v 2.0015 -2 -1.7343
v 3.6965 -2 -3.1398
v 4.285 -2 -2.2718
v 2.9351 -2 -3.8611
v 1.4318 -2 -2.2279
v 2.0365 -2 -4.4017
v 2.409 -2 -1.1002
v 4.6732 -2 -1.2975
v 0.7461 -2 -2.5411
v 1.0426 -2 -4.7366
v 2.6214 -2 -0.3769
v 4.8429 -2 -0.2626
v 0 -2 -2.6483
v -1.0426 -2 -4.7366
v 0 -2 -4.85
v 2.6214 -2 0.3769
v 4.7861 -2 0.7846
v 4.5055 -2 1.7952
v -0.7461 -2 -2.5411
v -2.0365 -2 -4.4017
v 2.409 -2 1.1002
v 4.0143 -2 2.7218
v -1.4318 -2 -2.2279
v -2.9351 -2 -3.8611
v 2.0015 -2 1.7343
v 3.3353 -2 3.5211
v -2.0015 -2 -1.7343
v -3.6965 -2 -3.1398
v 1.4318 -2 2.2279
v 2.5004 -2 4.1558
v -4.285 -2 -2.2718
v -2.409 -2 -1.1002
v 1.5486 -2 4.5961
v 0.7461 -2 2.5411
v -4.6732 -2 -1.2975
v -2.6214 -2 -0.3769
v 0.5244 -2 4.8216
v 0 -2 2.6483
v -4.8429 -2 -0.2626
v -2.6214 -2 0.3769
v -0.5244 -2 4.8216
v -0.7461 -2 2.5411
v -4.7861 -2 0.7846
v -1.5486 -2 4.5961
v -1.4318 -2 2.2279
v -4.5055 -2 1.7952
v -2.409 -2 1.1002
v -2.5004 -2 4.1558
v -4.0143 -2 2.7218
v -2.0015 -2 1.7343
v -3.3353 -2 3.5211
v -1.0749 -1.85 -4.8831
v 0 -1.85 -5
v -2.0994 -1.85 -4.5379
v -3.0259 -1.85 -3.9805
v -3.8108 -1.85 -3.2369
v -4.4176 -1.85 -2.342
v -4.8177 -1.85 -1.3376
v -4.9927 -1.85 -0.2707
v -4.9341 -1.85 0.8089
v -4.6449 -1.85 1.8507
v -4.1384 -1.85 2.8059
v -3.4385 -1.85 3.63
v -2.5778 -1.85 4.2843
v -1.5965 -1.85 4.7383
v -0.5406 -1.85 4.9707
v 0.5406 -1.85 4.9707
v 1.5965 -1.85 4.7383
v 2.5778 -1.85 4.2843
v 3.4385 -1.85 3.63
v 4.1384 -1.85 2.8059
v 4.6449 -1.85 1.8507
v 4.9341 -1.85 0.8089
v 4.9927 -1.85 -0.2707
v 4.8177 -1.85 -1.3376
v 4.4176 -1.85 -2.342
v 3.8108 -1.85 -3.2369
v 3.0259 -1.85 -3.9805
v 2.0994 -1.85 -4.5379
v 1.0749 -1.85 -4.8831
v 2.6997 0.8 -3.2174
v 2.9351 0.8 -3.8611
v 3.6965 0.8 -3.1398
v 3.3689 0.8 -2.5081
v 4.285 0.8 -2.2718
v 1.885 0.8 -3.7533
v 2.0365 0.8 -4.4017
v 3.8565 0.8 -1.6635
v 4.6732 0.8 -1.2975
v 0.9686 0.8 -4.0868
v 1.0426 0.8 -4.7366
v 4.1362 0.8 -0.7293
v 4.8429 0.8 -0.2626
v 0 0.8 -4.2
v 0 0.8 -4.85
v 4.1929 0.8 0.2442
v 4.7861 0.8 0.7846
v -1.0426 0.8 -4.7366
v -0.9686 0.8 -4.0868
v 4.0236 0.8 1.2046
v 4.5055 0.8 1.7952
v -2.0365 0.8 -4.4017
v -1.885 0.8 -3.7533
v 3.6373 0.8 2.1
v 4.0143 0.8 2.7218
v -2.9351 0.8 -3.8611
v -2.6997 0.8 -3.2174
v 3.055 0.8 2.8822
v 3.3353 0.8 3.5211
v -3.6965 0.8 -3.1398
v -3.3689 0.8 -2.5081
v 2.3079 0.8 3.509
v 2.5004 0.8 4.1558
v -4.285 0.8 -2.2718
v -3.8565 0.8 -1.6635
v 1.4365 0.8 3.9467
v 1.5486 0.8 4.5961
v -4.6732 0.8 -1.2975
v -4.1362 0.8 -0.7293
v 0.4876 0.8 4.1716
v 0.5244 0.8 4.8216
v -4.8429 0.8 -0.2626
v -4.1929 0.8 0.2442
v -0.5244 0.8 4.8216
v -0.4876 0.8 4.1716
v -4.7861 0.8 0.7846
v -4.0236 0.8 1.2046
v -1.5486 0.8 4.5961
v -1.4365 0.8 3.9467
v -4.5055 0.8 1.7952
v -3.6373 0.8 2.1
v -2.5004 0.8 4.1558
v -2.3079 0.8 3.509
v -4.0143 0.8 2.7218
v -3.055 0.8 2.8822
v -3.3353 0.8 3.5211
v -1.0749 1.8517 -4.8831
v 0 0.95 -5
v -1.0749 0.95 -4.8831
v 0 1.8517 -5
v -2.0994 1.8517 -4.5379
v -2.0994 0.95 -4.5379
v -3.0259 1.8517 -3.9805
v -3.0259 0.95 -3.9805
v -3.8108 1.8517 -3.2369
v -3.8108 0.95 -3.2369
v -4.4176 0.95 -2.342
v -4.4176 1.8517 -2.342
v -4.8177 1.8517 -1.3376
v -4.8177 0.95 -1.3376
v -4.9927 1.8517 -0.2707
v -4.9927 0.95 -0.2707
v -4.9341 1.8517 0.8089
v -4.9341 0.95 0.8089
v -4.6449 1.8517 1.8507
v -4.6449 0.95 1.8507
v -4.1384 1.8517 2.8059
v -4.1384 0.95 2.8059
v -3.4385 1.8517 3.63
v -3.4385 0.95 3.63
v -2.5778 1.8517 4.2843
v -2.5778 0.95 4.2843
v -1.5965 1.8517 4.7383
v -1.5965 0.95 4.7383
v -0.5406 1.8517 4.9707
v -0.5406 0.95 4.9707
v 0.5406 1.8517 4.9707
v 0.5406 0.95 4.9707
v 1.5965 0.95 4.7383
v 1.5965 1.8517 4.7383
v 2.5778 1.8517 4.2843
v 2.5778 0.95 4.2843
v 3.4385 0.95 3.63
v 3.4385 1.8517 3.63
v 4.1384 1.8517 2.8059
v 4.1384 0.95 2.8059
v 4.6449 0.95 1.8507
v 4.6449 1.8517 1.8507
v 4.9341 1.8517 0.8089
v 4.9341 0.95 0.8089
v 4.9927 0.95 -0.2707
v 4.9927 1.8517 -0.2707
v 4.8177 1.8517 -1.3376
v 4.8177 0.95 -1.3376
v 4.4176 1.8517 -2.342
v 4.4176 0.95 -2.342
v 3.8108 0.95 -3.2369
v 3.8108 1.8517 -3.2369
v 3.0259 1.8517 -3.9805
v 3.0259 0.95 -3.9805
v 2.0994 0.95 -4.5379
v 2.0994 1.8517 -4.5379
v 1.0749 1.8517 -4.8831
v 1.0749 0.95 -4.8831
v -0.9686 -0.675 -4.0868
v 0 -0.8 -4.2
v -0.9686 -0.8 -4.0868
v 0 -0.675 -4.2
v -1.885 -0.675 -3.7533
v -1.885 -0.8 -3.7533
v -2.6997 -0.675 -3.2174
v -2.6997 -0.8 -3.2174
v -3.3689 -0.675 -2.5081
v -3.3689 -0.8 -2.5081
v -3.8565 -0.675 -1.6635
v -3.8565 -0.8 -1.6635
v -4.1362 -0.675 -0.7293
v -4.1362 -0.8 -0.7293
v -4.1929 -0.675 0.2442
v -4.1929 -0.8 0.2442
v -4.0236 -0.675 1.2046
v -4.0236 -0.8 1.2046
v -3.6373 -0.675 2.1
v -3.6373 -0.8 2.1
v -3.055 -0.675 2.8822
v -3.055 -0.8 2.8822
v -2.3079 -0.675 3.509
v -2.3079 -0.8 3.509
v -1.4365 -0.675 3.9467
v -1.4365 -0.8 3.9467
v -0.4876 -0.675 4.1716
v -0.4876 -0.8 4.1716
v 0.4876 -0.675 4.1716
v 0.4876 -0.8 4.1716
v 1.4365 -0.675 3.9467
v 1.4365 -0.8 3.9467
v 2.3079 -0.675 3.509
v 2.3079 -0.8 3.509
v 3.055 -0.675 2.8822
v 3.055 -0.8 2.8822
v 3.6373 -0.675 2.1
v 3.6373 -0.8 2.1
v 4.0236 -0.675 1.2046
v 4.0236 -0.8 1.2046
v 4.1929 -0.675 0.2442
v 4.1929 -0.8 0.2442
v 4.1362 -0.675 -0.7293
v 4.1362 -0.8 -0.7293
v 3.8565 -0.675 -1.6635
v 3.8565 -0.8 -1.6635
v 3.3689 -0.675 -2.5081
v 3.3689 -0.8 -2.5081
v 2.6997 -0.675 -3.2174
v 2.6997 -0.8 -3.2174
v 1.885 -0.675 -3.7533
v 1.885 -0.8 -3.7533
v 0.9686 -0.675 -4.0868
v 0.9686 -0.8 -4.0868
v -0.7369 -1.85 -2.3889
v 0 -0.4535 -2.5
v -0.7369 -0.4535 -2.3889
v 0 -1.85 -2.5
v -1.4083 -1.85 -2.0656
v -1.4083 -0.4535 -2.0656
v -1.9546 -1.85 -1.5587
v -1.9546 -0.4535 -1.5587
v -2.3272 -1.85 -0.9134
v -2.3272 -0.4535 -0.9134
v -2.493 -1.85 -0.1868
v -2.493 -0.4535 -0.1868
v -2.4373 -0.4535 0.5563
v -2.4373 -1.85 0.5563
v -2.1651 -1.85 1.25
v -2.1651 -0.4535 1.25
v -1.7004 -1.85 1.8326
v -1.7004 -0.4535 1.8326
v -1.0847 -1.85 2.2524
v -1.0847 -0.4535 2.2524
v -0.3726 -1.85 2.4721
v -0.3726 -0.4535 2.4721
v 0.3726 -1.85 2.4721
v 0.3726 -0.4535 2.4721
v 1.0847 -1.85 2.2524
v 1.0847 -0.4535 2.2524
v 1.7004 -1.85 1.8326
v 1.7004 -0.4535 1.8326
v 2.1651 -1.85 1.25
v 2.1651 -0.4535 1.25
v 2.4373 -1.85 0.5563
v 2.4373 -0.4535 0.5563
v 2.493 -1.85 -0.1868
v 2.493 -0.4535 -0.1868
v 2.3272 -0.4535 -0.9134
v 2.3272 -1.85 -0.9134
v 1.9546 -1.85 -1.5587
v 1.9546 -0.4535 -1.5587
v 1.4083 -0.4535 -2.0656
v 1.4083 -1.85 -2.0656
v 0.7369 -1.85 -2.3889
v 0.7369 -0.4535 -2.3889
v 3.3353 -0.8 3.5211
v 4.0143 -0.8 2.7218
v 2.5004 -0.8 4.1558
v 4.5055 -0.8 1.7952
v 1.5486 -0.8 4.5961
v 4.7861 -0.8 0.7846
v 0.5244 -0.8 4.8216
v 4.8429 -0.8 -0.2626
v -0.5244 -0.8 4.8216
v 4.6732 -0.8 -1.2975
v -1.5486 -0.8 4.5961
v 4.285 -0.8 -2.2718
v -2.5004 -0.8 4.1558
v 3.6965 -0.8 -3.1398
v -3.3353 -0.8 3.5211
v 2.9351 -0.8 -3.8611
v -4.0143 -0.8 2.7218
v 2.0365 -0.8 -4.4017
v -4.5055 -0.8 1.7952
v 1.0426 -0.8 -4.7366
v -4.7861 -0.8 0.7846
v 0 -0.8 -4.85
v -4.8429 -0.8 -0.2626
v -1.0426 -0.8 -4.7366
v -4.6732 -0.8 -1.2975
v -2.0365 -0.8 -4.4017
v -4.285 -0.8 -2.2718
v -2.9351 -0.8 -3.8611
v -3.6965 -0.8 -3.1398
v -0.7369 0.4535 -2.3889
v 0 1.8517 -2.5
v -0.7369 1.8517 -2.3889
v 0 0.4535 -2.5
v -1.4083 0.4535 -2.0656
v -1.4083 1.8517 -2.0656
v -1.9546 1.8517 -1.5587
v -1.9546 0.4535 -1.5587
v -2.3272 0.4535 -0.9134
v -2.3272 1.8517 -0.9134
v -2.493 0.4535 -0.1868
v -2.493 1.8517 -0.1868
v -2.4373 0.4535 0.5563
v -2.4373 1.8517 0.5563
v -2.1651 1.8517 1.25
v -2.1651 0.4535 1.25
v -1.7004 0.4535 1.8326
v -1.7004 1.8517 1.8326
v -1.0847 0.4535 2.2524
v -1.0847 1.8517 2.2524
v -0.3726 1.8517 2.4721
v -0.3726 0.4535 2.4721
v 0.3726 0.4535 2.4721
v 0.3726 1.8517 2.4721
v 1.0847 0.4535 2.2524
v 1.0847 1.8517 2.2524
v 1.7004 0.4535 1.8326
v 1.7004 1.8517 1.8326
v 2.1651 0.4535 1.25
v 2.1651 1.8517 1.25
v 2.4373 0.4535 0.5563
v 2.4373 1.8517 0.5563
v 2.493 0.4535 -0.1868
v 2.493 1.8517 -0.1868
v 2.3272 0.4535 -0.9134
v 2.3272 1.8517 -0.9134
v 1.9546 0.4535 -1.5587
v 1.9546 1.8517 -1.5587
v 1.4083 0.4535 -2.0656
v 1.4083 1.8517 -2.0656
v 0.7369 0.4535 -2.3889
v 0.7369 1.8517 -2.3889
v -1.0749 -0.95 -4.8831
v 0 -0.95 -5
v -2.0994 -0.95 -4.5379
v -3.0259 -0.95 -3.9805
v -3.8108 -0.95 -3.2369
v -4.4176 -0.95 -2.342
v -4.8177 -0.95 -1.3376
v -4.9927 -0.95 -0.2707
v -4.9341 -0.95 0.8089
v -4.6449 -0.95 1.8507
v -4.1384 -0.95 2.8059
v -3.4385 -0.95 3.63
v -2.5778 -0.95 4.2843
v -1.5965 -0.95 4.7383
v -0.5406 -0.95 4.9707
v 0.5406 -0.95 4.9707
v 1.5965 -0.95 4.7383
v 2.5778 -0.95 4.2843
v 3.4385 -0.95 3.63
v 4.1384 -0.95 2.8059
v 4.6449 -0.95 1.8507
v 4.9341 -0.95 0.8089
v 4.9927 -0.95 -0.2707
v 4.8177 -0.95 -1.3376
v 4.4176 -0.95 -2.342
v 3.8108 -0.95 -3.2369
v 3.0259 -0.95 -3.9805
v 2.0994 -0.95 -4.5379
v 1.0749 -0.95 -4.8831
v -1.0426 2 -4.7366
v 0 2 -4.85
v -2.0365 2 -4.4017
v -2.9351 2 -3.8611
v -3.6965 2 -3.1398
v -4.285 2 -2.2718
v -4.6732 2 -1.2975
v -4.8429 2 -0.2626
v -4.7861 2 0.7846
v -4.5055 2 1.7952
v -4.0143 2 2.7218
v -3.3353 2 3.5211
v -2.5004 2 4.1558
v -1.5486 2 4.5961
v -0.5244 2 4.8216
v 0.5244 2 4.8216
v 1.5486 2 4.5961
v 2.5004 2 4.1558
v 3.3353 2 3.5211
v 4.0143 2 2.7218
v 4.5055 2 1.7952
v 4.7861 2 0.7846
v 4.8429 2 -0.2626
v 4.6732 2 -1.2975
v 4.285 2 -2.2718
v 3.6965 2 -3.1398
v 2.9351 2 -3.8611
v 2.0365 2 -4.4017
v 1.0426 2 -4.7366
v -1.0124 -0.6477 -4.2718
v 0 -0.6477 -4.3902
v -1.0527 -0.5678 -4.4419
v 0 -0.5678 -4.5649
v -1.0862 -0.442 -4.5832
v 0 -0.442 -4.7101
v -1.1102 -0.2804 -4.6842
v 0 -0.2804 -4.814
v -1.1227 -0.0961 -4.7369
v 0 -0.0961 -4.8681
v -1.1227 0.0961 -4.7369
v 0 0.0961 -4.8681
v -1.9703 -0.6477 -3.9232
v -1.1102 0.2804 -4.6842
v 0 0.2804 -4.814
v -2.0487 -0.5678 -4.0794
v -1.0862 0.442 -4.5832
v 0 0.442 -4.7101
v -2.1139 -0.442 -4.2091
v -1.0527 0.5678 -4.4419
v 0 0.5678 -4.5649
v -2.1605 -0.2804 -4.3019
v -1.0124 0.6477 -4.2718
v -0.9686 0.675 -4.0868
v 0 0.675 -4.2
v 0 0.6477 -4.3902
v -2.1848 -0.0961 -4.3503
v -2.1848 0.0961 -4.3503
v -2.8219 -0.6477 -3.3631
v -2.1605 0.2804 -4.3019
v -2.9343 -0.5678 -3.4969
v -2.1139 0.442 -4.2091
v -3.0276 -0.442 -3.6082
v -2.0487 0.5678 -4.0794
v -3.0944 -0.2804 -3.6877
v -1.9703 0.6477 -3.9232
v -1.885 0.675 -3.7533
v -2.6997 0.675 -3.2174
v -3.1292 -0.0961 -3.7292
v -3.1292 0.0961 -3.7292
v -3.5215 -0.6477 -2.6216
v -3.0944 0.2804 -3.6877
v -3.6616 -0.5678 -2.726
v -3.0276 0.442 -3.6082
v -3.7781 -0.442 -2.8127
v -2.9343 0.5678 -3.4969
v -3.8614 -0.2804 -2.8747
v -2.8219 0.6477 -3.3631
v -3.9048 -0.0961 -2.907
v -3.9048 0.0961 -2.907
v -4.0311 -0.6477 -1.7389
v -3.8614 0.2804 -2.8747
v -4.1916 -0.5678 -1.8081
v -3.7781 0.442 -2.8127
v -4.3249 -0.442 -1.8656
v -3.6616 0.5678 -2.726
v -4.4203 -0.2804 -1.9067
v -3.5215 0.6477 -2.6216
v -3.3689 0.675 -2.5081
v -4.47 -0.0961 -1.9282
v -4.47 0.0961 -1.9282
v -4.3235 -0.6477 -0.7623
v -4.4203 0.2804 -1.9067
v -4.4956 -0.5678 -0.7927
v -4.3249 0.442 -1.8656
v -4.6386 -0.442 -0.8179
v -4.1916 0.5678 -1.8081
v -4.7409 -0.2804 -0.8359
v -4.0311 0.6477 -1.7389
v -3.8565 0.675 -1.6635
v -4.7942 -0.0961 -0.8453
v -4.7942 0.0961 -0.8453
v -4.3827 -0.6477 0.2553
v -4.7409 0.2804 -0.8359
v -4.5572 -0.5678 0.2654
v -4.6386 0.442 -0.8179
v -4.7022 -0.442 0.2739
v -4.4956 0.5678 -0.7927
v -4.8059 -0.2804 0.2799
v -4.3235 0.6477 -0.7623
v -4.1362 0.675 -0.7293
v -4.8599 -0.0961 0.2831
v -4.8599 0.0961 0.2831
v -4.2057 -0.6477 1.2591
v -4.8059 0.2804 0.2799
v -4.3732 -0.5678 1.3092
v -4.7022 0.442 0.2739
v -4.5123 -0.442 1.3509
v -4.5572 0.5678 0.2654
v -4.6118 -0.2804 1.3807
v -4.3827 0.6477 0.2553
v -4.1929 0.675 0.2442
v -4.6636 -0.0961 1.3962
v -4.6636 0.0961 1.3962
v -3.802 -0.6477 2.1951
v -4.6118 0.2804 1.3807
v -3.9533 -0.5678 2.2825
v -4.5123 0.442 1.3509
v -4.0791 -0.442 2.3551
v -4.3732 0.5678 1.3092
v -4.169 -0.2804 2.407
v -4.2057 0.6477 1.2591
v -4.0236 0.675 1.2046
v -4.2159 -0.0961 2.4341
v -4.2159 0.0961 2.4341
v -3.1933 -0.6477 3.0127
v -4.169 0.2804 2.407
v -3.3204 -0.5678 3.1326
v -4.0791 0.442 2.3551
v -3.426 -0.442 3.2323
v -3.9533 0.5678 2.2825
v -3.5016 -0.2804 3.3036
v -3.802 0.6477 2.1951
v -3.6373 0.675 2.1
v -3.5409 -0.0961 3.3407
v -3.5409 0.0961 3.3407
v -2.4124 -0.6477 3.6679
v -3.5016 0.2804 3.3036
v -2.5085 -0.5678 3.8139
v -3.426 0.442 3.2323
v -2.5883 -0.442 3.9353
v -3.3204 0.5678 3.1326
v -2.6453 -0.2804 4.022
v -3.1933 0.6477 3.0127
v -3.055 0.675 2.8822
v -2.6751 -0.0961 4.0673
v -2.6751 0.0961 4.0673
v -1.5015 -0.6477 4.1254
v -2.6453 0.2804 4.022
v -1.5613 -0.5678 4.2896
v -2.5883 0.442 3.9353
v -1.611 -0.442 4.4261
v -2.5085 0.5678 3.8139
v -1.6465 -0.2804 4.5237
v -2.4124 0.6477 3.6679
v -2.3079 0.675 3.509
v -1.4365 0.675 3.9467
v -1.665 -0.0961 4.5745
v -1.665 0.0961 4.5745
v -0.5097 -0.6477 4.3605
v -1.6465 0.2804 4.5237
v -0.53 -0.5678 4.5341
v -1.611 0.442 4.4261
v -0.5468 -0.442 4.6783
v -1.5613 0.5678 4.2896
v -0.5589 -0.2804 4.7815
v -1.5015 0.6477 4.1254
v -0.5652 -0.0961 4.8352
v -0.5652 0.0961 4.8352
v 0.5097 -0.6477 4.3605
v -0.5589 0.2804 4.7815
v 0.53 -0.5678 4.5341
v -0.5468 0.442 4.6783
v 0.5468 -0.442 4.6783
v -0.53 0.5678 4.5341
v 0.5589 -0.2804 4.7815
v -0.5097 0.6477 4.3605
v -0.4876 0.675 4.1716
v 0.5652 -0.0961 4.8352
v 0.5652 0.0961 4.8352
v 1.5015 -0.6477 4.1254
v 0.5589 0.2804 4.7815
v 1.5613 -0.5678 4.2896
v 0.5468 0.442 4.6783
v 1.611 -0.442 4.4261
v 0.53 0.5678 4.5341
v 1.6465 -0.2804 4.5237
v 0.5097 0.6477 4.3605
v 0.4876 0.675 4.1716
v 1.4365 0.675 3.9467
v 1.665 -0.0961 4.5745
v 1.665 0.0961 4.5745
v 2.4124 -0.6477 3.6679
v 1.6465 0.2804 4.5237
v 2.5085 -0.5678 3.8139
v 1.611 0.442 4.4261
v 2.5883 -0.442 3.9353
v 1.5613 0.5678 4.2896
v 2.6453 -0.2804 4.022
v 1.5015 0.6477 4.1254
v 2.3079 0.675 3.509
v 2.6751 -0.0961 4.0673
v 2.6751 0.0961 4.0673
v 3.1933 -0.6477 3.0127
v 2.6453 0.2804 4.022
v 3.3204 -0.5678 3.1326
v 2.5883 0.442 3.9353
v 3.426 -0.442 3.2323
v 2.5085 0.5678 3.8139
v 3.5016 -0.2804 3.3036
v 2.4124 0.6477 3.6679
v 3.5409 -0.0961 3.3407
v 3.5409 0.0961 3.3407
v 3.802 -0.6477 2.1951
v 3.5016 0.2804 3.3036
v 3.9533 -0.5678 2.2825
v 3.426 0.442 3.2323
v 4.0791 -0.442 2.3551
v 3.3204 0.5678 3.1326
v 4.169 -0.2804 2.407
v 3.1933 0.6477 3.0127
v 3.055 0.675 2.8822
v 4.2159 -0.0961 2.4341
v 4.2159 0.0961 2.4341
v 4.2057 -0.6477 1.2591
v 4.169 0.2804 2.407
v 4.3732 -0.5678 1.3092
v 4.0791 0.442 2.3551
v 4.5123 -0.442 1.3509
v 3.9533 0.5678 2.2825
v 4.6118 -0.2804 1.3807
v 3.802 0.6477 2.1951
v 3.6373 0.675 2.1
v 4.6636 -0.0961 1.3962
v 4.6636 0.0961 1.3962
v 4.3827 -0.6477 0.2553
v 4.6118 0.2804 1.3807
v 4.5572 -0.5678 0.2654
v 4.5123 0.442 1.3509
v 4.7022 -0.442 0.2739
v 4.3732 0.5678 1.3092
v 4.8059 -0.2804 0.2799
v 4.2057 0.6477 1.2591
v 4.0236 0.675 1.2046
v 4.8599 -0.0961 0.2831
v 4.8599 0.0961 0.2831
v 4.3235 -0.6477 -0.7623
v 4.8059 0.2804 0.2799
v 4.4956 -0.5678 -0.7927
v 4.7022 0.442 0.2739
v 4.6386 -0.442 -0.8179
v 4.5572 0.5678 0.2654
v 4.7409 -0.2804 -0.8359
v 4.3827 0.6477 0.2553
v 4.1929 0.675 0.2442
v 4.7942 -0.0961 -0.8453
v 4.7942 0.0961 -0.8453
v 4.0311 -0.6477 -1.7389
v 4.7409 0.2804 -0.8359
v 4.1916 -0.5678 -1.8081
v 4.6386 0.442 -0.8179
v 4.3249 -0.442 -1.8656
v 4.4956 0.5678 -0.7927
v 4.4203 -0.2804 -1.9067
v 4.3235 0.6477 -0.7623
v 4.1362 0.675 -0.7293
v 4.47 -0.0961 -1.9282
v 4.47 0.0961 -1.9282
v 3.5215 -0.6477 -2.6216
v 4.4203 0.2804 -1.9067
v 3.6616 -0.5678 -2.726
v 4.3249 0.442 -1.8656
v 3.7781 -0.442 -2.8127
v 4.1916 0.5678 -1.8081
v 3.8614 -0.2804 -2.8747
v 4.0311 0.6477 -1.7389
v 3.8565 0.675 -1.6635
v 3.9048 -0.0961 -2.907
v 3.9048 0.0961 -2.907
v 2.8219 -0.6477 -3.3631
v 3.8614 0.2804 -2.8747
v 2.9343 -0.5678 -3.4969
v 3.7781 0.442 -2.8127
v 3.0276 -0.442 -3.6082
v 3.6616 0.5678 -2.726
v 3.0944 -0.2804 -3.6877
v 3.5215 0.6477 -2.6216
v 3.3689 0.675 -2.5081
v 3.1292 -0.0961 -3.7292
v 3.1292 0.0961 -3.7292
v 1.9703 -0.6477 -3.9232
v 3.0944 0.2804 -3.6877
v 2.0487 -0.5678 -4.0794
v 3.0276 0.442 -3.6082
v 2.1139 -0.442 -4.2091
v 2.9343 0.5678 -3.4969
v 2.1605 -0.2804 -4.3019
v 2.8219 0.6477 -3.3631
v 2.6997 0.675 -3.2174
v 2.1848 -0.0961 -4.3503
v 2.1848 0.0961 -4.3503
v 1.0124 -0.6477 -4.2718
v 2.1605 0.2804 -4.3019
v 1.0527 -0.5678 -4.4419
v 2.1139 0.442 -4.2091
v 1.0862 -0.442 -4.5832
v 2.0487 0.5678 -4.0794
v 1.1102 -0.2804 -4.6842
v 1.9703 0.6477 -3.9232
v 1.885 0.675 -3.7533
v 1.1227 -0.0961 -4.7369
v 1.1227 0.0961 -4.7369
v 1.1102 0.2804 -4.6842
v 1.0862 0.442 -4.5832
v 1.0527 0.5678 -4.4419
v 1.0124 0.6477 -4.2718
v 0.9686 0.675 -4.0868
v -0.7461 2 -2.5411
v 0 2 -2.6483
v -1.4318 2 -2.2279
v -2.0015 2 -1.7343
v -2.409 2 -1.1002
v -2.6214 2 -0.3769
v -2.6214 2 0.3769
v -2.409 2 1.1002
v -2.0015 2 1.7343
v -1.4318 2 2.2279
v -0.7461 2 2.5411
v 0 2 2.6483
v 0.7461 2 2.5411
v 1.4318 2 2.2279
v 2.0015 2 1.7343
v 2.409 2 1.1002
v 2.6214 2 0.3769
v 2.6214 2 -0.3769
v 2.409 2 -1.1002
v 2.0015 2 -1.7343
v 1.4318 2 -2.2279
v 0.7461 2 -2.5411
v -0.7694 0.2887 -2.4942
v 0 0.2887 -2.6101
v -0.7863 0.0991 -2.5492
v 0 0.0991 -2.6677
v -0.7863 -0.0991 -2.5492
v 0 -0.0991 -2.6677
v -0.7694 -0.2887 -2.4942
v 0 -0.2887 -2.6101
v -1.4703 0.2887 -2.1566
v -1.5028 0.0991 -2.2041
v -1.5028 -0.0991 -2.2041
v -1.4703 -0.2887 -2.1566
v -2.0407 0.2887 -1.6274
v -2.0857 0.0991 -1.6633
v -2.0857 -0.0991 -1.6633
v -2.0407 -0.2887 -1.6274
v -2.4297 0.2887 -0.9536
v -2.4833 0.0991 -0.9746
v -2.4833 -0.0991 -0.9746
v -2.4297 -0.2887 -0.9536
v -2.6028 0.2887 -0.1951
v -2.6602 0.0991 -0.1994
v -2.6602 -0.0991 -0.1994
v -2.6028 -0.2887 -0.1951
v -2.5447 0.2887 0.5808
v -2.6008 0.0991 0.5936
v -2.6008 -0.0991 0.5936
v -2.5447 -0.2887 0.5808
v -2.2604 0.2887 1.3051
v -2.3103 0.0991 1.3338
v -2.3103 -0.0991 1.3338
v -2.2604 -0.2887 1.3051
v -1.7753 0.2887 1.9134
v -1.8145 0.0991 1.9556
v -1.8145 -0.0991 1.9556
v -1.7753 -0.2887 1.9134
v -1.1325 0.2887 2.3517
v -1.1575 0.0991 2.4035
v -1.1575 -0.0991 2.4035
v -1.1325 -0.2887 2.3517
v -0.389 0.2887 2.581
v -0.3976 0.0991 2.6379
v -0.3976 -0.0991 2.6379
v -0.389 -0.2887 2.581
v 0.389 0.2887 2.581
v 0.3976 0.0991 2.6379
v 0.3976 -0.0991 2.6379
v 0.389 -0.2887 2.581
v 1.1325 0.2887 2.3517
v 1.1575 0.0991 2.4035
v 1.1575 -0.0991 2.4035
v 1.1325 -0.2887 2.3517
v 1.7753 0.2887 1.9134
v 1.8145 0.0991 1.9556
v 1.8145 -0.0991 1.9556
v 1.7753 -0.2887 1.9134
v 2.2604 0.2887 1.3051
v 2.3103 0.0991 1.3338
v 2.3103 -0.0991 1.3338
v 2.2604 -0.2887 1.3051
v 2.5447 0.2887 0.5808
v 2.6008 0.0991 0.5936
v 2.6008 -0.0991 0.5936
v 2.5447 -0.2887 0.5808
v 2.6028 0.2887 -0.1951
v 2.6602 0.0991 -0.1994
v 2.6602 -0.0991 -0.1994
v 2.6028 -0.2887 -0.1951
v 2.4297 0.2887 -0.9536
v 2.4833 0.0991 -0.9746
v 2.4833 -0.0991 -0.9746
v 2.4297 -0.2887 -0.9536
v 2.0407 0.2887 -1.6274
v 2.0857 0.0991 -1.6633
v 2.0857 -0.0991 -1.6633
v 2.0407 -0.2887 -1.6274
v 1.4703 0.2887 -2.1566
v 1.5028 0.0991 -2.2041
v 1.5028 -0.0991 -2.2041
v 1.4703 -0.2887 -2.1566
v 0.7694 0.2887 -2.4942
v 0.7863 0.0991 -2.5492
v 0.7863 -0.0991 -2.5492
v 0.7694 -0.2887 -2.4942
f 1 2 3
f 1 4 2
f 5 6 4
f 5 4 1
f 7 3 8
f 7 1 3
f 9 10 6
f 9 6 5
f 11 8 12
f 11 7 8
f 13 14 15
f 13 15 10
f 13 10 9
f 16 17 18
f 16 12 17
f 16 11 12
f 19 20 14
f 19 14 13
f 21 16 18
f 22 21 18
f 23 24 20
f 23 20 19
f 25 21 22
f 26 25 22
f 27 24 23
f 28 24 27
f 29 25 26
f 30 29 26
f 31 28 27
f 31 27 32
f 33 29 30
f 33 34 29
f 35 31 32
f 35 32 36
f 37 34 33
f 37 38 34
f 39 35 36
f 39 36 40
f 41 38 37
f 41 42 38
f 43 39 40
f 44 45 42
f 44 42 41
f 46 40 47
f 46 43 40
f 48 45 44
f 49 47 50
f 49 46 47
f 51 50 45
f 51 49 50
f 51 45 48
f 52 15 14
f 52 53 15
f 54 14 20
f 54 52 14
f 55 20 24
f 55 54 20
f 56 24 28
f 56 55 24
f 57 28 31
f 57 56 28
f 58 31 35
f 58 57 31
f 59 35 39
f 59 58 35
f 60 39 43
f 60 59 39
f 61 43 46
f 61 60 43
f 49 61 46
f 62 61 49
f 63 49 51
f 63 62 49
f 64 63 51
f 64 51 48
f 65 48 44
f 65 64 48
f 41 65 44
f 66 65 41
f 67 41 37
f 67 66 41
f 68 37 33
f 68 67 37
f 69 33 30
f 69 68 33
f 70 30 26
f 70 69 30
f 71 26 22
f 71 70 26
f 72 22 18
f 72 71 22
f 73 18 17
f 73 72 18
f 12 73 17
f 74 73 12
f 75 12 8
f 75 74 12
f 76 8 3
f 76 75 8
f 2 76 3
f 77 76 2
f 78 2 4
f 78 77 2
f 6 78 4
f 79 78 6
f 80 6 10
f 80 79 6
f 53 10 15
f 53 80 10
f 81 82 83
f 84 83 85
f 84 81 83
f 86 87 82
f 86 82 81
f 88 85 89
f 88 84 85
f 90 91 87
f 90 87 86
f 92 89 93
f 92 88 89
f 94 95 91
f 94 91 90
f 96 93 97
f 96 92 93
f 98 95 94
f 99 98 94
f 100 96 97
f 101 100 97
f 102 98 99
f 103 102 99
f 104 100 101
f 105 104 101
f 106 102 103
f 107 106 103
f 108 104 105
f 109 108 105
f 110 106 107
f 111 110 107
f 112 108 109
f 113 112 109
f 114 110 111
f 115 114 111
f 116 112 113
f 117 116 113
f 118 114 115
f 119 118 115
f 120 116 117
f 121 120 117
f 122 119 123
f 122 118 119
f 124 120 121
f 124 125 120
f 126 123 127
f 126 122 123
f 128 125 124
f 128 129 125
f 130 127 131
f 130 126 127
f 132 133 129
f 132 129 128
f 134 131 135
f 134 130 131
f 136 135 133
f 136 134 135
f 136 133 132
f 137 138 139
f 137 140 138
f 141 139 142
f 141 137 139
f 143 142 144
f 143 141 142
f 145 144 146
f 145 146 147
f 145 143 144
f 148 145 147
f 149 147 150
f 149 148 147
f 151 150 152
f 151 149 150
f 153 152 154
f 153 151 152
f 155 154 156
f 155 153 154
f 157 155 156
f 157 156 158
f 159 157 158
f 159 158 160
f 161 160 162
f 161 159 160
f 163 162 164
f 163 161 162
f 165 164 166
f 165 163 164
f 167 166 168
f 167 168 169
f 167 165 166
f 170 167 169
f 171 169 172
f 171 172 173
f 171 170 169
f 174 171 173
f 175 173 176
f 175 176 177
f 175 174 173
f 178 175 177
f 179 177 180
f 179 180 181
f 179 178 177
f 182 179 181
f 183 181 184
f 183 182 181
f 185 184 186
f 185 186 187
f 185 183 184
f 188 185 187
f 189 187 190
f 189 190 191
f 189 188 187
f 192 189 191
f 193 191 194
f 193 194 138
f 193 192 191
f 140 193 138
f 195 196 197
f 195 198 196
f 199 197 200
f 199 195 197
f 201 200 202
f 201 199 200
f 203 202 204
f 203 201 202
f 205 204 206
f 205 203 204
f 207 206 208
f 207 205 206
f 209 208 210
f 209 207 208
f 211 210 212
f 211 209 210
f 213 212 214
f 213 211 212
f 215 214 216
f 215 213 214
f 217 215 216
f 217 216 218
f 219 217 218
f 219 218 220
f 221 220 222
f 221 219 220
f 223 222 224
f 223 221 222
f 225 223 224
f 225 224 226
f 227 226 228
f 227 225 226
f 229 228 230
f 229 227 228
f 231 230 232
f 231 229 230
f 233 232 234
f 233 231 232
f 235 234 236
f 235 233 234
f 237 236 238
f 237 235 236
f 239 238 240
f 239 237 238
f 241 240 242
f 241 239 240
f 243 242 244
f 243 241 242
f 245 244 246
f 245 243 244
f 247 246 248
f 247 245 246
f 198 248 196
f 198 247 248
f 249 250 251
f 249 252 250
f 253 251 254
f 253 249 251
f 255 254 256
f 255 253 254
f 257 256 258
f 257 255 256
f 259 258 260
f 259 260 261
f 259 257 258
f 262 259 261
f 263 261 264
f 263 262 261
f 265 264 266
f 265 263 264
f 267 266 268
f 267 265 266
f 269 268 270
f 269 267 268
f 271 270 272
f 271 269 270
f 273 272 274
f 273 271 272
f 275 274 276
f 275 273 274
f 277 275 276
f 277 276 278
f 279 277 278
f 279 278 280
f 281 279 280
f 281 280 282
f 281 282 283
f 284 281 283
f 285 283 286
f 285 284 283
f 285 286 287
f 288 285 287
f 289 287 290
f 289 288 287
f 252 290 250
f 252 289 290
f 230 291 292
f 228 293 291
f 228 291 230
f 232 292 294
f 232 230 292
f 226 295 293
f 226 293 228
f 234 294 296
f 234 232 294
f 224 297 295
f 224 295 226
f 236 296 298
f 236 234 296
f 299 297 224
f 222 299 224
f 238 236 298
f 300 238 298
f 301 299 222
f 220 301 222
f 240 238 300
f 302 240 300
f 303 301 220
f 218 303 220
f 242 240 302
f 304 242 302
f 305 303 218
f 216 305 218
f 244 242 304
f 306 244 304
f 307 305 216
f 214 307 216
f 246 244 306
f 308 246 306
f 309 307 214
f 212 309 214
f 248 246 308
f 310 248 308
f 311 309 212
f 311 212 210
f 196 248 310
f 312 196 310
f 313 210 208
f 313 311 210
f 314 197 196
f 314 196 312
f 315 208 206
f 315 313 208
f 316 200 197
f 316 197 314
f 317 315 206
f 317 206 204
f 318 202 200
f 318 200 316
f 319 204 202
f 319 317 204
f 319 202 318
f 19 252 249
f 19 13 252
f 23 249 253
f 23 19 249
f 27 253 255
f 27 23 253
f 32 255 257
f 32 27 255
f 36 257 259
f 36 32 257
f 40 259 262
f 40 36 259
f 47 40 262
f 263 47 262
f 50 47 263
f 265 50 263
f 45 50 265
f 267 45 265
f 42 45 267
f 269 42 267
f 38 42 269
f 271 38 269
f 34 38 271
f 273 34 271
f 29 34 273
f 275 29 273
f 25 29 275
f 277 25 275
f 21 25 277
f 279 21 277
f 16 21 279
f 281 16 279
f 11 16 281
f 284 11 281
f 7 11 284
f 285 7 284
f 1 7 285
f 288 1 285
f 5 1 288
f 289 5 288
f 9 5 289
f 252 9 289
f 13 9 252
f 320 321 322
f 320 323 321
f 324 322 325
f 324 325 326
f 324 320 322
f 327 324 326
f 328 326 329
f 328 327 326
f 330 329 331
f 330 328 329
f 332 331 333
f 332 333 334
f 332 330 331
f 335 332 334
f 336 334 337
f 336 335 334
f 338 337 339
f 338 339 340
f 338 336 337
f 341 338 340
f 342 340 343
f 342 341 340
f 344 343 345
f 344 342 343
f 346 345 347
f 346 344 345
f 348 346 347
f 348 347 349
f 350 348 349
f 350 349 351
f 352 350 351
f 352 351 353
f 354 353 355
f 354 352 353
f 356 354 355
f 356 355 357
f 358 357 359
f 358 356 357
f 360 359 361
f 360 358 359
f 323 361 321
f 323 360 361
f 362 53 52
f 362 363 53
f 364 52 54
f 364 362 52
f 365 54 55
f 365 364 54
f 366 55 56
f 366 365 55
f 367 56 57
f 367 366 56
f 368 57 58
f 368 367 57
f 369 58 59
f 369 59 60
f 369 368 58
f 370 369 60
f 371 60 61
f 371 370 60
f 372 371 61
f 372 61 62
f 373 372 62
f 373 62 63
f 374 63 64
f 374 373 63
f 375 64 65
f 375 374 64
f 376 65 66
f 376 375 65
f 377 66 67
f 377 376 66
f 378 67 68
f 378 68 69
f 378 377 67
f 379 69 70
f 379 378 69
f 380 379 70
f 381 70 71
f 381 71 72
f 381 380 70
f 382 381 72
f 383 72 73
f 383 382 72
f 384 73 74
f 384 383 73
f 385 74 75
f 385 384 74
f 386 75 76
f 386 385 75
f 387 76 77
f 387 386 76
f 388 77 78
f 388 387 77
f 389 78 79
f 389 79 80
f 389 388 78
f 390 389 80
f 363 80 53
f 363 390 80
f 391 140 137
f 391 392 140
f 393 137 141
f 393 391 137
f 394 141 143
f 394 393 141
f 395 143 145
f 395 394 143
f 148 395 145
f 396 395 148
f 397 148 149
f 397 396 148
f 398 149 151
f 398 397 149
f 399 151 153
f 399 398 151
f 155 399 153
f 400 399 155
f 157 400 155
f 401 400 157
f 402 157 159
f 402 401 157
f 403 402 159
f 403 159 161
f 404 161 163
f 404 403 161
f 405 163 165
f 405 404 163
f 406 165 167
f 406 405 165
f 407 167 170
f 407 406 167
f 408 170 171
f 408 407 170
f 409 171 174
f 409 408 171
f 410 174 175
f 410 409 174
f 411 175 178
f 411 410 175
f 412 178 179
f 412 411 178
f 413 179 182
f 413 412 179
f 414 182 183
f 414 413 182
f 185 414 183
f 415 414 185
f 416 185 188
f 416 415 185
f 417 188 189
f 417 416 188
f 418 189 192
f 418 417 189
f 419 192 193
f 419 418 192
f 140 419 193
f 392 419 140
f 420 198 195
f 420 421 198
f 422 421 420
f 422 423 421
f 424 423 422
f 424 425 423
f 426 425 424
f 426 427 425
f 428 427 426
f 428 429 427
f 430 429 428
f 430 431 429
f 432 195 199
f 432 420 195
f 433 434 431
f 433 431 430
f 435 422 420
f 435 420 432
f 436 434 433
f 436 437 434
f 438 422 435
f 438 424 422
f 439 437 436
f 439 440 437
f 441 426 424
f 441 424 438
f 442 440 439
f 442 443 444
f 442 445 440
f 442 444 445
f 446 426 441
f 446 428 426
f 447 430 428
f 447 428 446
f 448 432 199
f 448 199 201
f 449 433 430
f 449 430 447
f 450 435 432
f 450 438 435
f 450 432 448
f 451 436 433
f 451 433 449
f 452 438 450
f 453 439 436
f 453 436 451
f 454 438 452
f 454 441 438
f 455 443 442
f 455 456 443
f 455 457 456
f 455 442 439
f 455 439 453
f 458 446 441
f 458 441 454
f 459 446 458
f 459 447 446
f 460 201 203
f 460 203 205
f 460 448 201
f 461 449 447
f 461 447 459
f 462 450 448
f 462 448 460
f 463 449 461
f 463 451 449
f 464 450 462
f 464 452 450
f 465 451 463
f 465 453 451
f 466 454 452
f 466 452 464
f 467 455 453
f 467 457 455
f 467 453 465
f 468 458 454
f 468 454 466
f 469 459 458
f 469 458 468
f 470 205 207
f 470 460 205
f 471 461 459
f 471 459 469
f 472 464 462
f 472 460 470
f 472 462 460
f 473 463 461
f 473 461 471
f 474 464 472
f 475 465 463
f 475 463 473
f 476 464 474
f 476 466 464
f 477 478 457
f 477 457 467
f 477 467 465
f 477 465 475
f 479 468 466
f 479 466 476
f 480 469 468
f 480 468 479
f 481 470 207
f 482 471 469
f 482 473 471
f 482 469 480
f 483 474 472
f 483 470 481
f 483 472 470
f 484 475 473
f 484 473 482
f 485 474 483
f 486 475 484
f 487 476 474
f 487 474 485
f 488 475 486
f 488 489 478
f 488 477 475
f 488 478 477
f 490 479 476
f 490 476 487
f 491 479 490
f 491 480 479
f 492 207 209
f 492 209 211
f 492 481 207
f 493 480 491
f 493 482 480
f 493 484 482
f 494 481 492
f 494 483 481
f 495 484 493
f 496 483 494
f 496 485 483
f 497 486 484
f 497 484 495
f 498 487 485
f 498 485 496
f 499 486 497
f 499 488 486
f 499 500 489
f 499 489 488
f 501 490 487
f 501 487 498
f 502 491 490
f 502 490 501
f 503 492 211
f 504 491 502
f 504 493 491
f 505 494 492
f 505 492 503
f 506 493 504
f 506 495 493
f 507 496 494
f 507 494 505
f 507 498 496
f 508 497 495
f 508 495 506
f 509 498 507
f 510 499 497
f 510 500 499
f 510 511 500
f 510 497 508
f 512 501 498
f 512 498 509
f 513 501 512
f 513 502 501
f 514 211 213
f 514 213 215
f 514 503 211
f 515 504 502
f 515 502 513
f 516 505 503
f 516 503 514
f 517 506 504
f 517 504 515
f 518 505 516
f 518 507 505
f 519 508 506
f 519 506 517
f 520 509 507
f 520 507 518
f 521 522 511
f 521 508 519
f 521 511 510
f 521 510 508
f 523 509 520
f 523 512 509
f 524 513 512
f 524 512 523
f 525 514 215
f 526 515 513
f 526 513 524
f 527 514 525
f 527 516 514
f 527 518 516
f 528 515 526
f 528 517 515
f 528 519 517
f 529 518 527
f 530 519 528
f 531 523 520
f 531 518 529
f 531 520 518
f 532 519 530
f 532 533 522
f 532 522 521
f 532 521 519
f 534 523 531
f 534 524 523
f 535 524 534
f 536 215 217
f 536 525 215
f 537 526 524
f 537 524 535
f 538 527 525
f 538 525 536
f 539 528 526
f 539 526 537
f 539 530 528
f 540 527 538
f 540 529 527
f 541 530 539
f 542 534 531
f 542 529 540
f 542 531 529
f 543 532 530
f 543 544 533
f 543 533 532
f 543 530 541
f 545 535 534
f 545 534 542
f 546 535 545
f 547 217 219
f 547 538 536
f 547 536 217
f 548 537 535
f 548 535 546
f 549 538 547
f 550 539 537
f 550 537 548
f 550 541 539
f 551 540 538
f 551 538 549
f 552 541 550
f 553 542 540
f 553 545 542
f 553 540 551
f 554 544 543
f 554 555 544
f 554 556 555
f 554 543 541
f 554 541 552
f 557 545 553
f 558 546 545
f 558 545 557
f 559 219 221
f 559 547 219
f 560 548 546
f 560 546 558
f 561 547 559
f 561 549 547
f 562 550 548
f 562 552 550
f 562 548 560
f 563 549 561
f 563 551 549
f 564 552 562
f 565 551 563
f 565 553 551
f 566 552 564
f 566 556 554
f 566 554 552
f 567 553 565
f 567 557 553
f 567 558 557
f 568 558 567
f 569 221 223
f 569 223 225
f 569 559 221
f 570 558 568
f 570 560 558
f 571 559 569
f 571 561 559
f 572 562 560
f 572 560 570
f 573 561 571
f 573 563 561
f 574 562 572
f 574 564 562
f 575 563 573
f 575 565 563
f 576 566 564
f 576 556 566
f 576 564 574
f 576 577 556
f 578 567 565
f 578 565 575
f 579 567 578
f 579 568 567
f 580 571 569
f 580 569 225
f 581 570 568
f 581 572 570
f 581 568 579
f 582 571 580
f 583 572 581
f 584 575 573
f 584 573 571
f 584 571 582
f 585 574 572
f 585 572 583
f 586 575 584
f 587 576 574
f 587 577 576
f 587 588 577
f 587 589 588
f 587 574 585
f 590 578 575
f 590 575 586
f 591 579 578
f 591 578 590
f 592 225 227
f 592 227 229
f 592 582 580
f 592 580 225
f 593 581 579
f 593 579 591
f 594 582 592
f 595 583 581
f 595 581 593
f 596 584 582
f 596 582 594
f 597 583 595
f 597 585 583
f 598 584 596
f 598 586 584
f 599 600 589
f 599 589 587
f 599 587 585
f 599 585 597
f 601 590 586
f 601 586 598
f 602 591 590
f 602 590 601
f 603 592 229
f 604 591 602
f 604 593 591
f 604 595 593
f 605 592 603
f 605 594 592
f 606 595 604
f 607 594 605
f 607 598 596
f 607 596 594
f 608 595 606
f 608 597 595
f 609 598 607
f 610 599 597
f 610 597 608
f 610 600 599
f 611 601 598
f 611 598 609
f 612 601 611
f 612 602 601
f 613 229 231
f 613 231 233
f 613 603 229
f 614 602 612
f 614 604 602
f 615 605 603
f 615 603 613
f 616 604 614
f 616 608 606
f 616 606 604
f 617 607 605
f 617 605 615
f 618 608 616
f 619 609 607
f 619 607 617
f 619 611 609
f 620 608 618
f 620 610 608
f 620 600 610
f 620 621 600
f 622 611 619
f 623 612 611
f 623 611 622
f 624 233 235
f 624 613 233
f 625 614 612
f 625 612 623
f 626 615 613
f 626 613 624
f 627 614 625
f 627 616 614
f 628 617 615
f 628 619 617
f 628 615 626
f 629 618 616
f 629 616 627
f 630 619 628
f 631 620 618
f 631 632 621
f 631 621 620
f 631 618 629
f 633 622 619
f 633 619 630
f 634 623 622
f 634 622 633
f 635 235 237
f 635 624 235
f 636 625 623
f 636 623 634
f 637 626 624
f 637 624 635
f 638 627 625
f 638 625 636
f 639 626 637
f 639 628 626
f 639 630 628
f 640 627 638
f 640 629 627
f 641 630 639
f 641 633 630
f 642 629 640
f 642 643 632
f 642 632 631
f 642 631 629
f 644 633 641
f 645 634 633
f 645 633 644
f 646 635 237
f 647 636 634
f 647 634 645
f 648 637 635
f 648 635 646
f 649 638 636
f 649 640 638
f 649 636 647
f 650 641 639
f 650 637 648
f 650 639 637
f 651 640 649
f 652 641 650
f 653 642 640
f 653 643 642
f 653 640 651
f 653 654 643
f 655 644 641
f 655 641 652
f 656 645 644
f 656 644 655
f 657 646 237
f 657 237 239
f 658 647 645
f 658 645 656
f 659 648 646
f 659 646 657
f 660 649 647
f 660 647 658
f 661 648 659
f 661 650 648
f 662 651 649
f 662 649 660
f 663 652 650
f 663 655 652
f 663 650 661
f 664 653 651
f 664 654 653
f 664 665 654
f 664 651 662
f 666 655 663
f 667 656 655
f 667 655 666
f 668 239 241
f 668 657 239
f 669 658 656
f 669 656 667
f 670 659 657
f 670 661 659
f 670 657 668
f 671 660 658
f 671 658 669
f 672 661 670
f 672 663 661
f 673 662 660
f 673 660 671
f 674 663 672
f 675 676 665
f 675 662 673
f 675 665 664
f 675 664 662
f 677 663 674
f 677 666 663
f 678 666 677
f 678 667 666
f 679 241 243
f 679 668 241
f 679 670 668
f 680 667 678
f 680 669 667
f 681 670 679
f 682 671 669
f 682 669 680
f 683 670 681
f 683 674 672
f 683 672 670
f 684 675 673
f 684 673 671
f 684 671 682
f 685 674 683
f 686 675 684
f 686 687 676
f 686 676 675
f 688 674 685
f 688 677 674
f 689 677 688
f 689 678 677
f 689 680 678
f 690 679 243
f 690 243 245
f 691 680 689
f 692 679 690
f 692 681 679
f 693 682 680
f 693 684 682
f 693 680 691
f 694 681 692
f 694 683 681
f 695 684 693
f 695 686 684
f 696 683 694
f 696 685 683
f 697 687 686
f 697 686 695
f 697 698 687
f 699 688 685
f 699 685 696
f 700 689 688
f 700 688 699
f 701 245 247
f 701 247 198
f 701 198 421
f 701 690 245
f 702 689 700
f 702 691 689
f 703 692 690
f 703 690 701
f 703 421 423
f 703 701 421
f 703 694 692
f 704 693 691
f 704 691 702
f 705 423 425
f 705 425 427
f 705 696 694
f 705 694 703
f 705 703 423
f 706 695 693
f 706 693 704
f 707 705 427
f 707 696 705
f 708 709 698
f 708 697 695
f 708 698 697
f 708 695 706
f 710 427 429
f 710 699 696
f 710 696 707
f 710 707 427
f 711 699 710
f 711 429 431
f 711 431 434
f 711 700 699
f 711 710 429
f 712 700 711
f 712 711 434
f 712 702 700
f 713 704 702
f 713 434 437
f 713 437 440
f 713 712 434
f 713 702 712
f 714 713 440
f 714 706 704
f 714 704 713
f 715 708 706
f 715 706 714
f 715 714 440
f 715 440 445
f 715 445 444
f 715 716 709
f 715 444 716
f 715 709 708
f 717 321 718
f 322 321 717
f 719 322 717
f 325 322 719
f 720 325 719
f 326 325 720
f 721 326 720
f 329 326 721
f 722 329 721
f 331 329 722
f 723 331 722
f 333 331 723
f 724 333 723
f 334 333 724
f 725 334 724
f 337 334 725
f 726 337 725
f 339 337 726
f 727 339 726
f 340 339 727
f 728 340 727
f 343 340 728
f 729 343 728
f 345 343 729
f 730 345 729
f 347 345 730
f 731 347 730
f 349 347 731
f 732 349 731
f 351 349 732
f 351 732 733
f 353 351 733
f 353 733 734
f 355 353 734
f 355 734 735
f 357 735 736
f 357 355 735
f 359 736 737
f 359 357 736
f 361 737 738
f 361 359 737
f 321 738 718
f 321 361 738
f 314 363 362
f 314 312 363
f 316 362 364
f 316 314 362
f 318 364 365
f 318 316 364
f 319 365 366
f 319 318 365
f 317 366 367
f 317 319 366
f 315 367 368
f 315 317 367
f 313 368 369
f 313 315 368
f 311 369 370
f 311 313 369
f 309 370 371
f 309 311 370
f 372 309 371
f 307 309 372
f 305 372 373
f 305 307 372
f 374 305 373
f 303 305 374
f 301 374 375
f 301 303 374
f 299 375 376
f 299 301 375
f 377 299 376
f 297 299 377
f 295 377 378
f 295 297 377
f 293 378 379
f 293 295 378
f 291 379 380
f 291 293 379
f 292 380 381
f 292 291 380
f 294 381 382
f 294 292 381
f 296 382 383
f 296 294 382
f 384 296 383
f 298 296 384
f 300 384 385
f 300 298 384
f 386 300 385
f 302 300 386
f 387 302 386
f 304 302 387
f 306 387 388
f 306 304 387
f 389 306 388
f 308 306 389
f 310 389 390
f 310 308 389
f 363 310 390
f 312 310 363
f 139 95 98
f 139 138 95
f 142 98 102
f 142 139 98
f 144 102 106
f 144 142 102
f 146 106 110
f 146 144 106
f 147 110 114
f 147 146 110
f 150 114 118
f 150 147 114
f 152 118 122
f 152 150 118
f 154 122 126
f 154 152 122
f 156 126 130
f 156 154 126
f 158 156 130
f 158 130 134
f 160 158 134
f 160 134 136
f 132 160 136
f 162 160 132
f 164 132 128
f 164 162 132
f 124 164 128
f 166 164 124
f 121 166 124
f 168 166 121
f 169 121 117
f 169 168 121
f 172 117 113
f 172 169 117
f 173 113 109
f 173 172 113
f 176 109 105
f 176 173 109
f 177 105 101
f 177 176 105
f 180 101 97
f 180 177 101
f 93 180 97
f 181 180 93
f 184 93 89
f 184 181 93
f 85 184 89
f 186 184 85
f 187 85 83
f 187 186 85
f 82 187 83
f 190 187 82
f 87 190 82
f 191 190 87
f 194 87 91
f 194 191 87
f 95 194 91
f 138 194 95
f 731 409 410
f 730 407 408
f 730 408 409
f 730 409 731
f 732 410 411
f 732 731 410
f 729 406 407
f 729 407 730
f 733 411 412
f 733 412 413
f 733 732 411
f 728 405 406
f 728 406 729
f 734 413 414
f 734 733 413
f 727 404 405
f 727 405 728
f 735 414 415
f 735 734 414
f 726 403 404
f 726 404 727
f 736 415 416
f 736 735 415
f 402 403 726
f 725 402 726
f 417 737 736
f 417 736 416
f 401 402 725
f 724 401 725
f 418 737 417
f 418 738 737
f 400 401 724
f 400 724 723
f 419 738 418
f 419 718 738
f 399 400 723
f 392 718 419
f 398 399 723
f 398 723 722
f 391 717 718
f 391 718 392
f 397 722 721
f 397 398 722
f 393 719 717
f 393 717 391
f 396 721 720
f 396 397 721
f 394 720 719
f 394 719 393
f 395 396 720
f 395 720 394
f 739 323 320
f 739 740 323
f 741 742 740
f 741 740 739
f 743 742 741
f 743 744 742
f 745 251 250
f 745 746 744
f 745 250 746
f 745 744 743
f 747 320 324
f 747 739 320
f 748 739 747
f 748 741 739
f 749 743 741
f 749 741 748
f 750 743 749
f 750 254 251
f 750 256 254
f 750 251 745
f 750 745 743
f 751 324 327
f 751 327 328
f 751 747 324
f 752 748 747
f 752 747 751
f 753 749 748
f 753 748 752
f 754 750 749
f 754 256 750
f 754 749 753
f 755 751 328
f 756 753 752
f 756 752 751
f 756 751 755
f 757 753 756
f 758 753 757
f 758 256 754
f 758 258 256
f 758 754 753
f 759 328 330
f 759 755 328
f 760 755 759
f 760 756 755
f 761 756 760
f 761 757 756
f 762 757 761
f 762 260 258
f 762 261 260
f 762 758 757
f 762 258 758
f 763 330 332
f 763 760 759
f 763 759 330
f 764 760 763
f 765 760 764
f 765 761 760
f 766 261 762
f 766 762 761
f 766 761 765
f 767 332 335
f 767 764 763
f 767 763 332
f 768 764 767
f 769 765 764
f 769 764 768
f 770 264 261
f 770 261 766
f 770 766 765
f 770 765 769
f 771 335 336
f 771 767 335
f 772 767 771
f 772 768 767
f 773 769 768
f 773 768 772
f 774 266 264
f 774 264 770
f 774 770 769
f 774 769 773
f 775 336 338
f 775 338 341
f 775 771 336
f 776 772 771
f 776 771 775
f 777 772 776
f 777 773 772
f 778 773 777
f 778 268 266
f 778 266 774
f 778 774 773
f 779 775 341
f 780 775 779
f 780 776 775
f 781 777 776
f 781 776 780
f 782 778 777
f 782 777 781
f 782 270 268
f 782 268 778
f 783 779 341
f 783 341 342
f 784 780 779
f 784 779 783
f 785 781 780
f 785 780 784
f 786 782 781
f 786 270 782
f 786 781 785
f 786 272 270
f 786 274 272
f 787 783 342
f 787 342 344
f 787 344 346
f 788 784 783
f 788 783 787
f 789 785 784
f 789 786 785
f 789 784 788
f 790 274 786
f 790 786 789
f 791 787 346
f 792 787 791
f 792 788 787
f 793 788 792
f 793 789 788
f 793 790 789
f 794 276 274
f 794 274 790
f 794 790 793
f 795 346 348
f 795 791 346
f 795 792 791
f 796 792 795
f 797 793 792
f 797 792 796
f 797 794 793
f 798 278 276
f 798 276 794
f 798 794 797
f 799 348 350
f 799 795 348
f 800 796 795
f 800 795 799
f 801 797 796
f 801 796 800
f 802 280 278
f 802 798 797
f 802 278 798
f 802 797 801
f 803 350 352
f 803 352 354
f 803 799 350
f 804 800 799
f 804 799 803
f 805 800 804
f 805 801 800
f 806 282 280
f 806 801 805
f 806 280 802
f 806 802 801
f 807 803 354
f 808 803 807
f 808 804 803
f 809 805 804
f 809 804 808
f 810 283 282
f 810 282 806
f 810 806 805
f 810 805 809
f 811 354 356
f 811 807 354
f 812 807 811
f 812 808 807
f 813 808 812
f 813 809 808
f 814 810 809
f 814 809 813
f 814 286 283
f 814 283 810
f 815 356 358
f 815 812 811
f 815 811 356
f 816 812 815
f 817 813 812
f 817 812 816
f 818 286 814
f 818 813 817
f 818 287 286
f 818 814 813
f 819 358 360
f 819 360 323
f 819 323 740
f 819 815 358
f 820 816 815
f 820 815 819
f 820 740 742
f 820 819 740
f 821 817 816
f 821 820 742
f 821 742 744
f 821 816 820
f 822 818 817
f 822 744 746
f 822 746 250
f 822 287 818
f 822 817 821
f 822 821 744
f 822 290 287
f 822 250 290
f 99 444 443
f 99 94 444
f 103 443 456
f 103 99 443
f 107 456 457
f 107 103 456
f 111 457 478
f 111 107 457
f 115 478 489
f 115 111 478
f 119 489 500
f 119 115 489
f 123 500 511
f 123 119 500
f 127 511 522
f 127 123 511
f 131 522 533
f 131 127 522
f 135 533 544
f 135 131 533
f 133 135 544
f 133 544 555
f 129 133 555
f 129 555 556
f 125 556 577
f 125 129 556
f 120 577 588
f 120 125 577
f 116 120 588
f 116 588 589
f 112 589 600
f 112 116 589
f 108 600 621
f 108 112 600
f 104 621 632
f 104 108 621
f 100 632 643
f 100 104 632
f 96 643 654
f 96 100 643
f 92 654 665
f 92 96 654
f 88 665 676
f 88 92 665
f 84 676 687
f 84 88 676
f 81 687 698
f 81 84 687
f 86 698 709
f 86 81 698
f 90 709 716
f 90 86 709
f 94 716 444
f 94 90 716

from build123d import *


with BuildPart() as part:
    # Sketch1 → Revolve1 (revolve)
    with BuildSketch(Plane.XY, mode=Mode.PRIVATE) as revolve1_sk:
        with BuildLine():
            Line((5, 0.95), (5, 1.851651123))
            Line((5, 1.851651123), (4.85, 2))
            Line((4.85, 2), (2.648348877, 2))
            Line((2.648348877, 2), (2.5, 1.851651123))
            Line((2.5, 1.851651123), (2.5, 0.453458929))
            ThreePointArc((2.5, 0.453458929), (2.675, 0), (2.5, -0.453458929))
            Line((2.5, -0.453458929), (2.5, -1.85))
            Line((2.5, -1.85), (2.648348877, -2))
            Line((2.648348877, -2), (4.85, -2))
            Line((4.85, -2), (5, -1.85))
            Line((5, -1.85), (5, -0.95))
            Line((5, -0.95), (4.85, -0.8))
            Line((4.85, -0.8), (4.2, -0.8))
            Line((4.2, -0.8), (4.2, -0.675))
            ThreePointArc((4.2, -0.675), (4.875, 0), (4.2, 0.675))
            Line((4.2, 0.675), (4.2, 0.8))
            Line((4.2, 0.8), (4.85, 0.8))
            Line((4.85, 0.8), (5, 0.95))
        make_face()
    revolve(revolve1_sk.sketch.rotate(Axis((0, -7.575237451, 0), (0, 1, 0)), 90), axis=Axis((0, -7.575237451, 0), (0, 1, 0)))


solid = part.part
